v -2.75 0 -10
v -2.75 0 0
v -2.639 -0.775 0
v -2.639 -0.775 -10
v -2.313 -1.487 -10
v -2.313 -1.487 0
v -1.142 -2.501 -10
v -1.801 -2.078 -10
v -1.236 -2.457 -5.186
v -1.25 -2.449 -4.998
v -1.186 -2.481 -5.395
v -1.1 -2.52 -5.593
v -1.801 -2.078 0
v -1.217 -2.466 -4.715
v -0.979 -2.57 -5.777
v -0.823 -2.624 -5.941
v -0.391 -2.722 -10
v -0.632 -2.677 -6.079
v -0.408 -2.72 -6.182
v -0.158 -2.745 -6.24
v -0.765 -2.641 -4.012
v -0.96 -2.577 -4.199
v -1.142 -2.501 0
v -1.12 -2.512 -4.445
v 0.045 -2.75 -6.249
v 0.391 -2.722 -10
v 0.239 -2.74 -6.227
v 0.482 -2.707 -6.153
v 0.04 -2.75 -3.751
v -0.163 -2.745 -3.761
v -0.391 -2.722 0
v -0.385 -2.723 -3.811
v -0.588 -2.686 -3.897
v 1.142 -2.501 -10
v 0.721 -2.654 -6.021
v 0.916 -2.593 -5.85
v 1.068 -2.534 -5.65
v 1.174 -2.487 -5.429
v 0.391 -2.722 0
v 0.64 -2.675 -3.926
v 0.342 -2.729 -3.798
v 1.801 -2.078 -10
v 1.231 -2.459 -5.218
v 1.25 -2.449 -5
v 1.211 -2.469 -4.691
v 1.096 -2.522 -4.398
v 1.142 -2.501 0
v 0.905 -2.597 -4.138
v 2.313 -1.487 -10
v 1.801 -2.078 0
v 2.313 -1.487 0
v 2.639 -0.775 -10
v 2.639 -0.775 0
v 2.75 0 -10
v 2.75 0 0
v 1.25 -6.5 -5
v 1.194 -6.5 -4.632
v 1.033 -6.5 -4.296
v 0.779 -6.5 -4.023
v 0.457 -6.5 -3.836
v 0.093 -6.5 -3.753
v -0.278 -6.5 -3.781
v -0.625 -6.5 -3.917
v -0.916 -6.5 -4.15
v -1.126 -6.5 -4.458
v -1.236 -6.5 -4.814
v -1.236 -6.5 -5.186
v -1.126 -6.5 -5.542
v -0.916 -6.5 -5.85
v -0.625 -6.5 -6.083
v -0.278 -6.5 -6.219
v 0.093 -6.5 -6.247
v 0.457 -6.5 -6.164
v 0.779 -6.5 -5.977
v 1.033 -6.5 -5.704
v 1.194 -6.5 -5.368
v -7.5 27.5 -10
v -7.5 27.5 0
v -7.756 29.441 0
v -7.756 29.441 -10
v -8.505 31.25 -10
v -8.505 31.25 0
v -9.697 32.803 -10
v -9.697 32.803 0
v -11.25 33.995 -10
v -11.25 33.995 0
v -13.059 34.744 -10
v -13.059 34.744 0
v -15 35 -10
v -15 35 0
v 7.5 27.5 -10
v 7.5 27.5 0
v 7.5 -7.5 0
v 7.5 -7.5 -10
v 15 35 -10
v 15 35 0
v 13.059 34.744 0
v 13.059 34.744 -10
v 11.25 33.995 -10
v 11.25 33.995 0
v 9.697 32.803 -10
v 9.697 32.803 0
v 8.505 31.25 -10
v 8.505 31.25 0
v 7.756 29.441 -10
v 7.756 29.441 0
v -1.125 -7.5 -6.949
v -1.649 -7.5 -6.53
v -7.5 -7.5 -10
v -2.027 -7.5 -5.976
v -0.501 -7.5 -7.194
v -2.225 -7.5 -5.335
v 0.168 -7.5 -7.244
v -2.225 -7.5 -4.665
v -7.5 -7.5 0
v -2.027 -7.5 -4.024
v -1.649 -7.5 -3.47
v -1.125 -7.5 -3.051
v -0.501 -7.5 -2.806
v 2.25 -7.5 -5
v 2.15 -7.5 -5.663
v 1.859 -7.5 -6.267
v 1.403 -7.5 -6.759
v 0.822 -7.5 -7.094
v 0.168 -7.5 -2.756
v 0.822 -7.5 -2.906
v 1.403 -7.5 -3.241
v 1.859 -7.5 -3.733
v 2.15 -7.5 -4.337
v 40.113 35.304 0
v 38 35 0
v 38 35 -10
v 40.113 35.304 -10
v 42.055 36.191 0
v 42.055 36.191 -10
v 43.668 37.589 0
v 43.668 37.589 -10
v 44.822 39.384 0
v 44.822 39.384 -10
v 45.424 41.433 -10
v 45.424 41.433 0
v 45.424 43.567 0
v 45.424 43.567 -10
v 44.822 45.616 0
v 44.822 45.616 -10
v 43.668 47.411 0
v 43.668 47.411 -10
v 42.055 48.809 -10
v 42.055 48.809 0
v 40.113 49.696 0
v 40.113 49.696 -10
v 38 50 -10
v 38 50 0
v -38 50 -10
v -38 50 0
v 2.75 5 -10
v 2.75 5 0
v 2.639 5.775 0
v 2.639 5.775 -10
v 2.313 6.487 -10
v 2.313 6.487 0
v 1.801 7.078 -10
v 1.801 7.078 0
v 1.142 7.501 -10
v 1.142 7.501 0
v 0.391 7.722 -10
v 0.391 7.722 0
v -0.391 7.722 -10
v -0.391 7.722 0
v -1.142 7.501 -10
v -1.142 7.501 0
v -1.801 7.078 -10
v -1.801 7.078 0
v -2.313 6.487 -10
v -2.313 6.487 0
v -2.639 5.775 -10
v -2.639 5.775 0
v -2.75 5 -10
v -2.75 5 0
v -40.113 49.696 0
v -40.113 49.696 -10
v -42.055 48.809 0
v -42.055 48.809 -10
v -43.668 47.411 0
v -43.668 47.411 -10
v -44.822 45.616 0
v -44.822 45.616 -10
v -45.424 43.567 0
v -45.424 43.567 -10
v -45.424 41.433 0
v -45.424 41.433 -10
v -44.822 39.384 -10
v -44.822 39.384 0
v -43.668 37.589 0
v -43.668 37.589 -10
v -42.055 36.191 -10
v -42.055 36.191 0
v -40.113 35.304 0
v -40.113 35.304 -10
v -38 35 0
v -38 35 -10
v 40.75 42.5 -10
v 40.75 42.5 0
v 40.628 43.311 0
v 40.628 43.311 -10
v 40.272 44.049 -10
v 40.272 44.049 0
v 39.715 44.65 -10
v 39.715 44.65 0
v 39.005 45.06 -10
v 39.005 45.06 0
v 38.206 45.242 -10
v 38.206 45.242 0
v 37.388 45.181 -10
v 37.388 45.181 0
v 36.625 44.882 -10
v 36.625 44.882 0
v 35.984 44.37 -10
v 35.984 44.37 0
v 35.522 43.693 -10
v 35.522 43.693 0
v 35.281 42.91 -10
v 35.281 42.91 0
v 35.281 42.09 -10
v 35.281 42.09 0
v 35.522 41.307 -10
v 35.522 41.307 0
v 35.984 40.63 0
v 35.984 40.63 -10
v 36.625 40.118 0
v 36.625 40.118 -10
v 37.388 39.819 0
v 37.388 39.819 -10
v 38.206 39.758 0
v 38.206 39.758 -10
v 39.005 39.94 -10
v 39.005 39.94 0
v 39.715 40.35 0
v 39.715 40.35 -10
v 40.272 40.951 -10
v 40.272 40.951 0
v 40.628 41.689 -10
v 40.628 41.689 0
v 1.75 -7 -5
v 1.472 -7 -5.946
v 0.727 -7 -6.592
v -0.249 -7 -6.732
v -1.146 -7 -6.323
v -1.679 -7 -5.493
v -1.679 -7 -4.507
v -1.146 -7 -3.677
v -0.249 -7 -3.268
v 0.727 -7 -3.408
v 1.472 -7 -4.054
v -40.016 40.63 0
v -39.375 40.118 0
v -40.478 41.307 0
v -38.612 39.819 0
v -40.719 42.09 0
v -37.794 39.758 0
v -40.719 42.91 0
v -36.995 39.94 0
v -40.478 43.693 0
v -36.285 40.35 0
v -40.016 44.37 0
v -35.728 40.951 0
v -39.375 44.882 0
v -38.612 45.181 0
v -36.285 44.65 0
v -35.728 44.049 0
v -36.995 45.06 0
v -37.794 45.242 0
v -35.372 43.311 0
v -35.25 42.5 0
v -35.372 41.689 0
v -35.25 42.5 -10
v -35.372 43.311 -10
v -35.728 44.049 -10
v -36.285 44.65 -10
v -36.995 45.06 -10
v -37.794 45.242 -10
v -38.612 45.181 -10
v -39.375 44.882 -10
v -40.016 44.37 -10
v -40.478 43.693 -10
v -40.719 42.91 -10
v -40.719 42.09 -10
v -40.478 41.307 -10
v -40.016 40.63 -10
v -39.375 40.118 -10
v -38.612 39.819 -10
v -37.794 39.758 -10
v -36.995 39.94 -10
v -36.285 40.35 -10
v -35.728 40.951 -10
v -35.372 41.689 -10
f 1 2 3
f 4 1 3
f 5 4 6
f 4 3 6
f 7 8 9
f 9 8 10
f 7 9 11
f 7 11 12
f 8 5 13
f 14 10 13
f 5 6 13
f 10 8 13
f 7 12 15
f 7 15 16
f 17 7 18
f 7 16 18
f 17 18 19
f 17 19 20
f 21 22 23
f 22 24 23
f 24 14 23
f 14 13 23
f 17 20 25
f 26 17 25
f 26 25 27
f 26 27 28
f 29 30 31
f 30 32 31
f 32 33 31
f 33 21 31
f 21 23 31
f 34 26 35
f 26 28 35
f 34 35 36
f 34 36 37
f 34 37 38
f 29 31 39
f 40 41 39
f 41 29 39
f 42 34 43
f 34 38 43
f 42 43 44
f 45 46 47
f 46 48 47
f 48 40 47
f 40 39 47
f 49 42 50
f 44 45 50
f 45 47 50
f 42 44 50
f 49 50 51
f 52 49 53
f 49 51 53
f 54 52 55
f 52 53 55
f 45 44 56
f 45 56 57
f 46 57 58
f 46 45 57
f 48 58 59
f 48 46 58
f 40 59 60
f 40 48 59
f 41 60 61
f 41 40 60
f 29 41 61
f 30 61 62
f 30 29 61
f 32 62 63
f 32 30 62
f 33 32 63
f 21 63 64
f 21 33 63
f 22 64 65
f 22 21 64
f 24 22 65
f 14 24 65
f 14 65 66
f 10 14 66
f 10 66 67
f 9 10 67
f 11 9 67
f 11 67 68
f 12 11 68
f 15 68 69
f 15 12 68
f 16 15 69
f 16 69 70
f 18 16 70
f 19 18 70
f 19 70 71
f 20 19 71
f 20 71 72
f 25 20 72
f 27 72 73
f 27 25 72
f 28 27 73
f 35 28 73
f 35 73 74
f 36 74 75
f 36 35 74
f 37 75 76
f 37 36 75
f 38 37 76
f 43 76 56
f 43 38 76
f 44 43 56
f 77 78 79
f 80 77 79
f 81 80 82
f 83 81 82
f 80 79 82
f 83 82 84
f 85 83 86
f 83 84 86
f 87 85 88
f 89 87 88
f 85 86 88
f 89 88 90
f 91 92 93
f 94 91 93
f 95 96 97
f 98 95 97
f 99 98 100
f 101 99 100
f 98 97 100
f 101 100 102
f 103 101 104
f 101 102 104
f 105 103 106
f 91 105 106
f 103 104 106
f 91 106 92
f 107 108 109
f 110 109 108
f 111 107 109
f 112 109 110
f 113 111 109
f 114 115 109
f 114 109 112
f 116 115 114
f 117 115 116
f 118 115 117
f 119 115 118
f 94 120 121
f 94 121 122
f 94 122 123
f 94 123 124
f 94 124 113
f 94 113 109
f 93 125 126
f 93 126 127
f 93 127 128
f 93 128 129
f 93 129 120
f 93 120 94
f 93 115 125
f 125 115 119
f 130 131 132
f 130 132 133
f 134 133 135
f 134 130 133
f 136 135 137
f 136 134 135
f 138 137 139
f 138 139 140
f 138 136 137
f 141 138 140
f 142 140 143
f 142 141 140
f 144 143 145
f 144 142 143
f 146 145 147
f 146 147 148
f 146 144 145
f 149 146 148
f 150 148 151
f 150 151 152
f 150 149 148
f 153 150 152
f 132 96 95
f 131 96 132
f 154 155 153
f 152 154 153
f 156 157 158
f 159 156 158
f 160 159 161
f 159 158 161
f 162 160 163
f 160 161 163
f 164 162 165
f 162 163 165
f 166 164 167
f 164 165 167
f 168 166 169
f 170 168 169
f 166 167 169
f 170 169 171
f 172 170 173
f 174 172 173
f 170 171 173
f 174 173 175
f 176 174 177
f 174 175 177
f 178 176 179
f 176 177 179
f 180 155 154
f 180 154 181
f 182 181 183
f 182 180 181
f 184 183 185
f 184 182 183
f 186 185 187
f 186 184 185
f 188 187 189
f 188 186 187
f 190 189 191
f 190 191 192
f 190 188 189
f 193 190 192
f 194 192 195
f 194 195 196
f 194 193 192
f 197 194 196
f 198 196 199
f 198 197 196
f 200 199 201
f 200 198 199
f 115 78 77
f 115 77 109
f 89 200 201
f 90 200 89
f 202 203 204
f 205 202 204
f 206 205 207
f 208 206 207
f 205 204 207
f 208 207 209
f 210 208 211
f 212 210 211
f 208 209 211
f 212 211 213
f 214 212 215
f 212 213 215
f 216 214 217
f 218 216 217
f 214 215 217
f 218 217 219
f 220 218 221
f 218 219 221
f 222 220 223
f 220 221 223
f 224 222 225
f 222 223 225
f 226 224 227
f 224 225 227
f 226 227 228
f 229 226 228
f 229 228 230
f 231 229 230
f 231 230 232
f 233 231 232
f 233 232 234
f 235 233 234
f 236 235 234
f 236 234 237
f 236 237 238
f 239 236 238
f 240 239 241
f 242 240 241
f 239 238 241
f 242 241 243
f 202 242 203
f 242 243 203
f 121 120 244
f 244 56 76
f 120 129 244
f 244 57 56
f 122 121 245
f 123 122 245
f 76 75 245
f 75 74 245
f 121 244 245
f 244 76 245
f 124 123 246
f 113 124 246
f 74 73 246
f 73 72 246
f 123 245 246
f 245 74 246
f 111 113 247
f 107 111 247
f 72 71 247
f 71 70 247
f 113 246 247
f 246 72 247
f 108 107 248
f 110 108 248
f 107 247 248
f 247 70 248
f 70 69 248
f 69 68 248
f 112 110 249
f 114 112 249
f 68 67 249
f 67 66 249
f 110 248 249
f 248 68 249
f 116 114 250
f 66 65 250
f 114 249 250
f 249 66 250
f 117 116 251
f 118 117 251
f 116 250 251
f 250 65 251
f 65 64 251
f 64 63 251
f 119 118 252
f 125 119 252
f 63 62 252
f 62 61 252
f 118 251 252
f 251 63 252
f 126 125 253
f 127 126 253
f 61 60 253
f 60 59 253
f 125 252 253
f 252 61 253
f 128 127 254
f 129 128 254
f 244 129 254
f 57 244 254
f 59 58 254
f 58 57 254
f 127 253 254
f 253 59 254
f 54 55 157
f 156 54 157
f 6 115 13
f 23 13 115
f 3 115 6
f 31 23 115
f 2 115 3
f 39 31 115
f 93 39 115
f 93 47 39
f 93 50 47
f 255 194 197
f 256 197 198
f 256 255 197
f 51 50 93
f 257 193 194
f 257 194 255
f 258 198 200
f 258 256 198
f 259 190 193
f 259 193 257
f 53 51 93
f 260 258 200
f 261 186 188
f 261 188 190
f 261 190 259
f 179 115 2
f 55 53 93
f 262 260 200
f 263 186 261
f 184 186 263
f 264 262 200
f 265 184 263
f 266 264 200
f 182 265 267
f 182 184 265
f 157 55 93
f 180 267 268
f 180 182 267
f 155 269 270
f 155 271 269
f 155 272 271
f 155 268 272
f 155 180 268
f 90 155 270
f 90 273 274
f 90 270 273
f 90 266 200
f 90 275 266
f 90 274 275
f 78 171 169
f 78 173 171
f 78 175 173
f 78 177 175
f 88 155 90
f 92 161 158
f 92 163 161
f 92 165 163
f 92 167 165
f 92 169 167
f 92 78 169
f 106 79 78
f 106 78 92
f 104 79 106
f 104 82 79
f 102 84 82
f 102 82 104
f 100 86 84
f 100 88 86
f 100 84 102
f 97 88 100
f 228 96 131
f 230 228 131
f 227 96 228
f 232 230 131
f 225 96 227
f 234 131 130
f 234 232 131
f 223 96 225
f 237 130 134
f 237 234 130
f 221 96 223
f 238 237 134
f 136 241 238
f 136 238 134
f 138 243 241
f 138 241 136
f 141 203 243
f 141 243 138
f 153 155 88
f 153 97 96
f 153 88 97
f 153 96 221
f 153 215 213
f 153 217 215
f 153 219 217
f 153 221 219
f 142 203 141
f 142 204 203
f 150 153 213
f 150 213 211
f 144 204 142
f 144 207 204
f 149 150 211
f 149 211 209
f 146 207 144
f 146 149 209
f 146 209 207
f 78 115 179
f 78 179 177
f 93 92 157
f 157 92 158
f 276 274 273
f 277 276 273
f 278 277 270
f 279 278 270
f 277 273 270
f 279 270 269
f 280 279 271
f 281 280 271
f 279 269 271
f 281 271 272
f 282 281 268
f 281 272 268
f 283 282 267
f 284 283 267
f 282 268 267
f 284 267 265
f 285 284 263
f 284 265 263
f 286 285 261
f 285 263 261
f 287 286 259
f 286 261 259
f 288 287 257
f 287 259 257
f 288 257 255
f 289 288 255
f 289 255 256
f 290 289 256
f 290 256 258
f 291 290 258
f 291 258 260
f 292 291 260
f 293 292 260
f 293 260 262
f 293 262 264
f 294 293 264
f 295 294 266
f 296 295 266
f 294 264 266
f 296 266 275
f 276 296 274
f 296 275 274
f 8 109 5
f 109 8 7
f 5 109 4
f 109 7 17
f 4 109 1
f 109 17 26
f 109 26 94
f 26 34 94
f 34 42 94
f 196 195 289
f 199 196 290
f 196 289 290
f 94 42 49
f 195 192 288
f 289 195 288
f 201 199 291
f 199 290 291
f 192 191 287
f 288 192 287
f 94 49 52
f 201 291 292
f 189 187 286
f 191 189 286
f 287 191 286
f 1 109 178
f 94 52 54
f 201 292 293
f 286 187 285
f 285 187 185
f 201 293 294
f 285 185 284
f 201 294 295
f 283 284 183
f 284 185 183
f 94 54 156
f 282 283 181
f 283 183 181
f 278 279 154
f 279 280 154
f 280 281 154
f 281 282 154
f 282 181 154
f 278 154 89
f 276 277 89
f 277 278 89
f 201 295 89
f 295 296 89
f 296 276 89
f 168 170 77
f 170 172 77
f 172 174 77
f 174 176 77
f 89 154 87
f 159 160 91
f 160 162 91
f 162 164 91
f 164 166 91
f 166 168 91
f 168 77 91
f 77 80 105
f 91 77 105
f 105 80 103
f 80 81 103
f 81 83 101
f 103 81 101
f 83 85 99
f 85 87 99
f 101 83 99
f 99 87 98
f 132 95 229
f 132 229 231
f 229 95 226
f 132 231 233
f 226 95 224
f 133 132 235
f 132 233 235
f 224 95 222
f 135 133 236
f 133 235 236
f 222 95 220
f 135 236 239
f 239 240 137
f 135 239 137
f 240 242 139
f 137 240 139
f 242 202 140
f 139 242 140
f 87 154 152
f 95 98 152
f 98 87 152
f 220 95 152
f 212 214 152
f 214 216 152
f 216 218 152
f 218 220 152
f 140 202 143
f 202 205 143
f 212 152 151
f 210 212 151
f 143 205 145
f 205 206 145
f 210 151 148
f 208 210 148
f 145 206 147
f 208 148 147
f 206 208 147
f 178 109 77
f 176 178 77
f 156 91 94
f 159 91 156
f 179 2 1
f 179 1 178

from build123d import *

# Parameters (mm, degrees)
SKETCH_R     = 2.75
PAD_DEPTH    = 10
SKETCH002_R  = 1.25
HOLE_DEPTH   = 7.501
CHAMFER_SIZE = 1


with BuildPart() as part:
    # Sketch → Pad (new body)
    with BuildSketch(Plane.XY):
        with BuildLine():
            ThreePointArc((-38.000002, 50), (-45.500002, 42.5), (-38.000002, 35))
            Line((-38.000002, 35), (-15, 35))
            ThreePointArc((-7.5, 27.5), (-9.696699, 32.803301), (-15, 35))
            Line((-7.5, 27.5), (-7.5, -7.5))
            Line((-7.5, -7.5), (7.5, -7.5))
            Line((7.5, 27.5), (7.5, -7.5))
            ThreePointArc((15, 35), (9.696699, 32.803301), (7.5, 27.5))
            Line((15, 35), (38.000002, 35))
            ThreePointArc((38.000002, 35), (45.499998, 42.500002), (37.999998, 50))
            Line((-38.000002, 50), (37.999998, 50))
        make_face()
        with Locations((-38.000002, 42.5)):
            Circle(SKETCH_R, mode=Mode.SUBTRACT)
        with Locations((37.999998, 42.5)):
            Circle(SKETCH_R, mode=Mode.SUBTRACT)
        with BuildLine():
            ThreePointArc((-2.75, 0), (0, -2.75), (2.75, 0))
            Line((2.75, 0), (2.75, 5))
            ThreePointArc((2.75, 5), (0, 7.75), (-2.75, 5))
            Line((-2.75, 0), (-2.75, 5))
        make_face(mode=Mode.SUBTRACT)
    extrude(amount=-PAD_DEPTH)

    # Sketch002 → Hole (cut, through all)
    with BuildSketch(Plane.XZ):
        with Locations((0, -5)):
            Circle(SKETCH002_R)
    extrude(amount=HOLE_DEPTH, mode=Mode.SUBTRACT)

    # Chamfer
    chamfer_edges = [part.edges().sort_by_distance(p)[0] for p in [
        (-1.25, -7.5, -5),
    ]]
    chamfer(chamfer_edges, length=CHAMFER_SIZE)


solid = part.part
